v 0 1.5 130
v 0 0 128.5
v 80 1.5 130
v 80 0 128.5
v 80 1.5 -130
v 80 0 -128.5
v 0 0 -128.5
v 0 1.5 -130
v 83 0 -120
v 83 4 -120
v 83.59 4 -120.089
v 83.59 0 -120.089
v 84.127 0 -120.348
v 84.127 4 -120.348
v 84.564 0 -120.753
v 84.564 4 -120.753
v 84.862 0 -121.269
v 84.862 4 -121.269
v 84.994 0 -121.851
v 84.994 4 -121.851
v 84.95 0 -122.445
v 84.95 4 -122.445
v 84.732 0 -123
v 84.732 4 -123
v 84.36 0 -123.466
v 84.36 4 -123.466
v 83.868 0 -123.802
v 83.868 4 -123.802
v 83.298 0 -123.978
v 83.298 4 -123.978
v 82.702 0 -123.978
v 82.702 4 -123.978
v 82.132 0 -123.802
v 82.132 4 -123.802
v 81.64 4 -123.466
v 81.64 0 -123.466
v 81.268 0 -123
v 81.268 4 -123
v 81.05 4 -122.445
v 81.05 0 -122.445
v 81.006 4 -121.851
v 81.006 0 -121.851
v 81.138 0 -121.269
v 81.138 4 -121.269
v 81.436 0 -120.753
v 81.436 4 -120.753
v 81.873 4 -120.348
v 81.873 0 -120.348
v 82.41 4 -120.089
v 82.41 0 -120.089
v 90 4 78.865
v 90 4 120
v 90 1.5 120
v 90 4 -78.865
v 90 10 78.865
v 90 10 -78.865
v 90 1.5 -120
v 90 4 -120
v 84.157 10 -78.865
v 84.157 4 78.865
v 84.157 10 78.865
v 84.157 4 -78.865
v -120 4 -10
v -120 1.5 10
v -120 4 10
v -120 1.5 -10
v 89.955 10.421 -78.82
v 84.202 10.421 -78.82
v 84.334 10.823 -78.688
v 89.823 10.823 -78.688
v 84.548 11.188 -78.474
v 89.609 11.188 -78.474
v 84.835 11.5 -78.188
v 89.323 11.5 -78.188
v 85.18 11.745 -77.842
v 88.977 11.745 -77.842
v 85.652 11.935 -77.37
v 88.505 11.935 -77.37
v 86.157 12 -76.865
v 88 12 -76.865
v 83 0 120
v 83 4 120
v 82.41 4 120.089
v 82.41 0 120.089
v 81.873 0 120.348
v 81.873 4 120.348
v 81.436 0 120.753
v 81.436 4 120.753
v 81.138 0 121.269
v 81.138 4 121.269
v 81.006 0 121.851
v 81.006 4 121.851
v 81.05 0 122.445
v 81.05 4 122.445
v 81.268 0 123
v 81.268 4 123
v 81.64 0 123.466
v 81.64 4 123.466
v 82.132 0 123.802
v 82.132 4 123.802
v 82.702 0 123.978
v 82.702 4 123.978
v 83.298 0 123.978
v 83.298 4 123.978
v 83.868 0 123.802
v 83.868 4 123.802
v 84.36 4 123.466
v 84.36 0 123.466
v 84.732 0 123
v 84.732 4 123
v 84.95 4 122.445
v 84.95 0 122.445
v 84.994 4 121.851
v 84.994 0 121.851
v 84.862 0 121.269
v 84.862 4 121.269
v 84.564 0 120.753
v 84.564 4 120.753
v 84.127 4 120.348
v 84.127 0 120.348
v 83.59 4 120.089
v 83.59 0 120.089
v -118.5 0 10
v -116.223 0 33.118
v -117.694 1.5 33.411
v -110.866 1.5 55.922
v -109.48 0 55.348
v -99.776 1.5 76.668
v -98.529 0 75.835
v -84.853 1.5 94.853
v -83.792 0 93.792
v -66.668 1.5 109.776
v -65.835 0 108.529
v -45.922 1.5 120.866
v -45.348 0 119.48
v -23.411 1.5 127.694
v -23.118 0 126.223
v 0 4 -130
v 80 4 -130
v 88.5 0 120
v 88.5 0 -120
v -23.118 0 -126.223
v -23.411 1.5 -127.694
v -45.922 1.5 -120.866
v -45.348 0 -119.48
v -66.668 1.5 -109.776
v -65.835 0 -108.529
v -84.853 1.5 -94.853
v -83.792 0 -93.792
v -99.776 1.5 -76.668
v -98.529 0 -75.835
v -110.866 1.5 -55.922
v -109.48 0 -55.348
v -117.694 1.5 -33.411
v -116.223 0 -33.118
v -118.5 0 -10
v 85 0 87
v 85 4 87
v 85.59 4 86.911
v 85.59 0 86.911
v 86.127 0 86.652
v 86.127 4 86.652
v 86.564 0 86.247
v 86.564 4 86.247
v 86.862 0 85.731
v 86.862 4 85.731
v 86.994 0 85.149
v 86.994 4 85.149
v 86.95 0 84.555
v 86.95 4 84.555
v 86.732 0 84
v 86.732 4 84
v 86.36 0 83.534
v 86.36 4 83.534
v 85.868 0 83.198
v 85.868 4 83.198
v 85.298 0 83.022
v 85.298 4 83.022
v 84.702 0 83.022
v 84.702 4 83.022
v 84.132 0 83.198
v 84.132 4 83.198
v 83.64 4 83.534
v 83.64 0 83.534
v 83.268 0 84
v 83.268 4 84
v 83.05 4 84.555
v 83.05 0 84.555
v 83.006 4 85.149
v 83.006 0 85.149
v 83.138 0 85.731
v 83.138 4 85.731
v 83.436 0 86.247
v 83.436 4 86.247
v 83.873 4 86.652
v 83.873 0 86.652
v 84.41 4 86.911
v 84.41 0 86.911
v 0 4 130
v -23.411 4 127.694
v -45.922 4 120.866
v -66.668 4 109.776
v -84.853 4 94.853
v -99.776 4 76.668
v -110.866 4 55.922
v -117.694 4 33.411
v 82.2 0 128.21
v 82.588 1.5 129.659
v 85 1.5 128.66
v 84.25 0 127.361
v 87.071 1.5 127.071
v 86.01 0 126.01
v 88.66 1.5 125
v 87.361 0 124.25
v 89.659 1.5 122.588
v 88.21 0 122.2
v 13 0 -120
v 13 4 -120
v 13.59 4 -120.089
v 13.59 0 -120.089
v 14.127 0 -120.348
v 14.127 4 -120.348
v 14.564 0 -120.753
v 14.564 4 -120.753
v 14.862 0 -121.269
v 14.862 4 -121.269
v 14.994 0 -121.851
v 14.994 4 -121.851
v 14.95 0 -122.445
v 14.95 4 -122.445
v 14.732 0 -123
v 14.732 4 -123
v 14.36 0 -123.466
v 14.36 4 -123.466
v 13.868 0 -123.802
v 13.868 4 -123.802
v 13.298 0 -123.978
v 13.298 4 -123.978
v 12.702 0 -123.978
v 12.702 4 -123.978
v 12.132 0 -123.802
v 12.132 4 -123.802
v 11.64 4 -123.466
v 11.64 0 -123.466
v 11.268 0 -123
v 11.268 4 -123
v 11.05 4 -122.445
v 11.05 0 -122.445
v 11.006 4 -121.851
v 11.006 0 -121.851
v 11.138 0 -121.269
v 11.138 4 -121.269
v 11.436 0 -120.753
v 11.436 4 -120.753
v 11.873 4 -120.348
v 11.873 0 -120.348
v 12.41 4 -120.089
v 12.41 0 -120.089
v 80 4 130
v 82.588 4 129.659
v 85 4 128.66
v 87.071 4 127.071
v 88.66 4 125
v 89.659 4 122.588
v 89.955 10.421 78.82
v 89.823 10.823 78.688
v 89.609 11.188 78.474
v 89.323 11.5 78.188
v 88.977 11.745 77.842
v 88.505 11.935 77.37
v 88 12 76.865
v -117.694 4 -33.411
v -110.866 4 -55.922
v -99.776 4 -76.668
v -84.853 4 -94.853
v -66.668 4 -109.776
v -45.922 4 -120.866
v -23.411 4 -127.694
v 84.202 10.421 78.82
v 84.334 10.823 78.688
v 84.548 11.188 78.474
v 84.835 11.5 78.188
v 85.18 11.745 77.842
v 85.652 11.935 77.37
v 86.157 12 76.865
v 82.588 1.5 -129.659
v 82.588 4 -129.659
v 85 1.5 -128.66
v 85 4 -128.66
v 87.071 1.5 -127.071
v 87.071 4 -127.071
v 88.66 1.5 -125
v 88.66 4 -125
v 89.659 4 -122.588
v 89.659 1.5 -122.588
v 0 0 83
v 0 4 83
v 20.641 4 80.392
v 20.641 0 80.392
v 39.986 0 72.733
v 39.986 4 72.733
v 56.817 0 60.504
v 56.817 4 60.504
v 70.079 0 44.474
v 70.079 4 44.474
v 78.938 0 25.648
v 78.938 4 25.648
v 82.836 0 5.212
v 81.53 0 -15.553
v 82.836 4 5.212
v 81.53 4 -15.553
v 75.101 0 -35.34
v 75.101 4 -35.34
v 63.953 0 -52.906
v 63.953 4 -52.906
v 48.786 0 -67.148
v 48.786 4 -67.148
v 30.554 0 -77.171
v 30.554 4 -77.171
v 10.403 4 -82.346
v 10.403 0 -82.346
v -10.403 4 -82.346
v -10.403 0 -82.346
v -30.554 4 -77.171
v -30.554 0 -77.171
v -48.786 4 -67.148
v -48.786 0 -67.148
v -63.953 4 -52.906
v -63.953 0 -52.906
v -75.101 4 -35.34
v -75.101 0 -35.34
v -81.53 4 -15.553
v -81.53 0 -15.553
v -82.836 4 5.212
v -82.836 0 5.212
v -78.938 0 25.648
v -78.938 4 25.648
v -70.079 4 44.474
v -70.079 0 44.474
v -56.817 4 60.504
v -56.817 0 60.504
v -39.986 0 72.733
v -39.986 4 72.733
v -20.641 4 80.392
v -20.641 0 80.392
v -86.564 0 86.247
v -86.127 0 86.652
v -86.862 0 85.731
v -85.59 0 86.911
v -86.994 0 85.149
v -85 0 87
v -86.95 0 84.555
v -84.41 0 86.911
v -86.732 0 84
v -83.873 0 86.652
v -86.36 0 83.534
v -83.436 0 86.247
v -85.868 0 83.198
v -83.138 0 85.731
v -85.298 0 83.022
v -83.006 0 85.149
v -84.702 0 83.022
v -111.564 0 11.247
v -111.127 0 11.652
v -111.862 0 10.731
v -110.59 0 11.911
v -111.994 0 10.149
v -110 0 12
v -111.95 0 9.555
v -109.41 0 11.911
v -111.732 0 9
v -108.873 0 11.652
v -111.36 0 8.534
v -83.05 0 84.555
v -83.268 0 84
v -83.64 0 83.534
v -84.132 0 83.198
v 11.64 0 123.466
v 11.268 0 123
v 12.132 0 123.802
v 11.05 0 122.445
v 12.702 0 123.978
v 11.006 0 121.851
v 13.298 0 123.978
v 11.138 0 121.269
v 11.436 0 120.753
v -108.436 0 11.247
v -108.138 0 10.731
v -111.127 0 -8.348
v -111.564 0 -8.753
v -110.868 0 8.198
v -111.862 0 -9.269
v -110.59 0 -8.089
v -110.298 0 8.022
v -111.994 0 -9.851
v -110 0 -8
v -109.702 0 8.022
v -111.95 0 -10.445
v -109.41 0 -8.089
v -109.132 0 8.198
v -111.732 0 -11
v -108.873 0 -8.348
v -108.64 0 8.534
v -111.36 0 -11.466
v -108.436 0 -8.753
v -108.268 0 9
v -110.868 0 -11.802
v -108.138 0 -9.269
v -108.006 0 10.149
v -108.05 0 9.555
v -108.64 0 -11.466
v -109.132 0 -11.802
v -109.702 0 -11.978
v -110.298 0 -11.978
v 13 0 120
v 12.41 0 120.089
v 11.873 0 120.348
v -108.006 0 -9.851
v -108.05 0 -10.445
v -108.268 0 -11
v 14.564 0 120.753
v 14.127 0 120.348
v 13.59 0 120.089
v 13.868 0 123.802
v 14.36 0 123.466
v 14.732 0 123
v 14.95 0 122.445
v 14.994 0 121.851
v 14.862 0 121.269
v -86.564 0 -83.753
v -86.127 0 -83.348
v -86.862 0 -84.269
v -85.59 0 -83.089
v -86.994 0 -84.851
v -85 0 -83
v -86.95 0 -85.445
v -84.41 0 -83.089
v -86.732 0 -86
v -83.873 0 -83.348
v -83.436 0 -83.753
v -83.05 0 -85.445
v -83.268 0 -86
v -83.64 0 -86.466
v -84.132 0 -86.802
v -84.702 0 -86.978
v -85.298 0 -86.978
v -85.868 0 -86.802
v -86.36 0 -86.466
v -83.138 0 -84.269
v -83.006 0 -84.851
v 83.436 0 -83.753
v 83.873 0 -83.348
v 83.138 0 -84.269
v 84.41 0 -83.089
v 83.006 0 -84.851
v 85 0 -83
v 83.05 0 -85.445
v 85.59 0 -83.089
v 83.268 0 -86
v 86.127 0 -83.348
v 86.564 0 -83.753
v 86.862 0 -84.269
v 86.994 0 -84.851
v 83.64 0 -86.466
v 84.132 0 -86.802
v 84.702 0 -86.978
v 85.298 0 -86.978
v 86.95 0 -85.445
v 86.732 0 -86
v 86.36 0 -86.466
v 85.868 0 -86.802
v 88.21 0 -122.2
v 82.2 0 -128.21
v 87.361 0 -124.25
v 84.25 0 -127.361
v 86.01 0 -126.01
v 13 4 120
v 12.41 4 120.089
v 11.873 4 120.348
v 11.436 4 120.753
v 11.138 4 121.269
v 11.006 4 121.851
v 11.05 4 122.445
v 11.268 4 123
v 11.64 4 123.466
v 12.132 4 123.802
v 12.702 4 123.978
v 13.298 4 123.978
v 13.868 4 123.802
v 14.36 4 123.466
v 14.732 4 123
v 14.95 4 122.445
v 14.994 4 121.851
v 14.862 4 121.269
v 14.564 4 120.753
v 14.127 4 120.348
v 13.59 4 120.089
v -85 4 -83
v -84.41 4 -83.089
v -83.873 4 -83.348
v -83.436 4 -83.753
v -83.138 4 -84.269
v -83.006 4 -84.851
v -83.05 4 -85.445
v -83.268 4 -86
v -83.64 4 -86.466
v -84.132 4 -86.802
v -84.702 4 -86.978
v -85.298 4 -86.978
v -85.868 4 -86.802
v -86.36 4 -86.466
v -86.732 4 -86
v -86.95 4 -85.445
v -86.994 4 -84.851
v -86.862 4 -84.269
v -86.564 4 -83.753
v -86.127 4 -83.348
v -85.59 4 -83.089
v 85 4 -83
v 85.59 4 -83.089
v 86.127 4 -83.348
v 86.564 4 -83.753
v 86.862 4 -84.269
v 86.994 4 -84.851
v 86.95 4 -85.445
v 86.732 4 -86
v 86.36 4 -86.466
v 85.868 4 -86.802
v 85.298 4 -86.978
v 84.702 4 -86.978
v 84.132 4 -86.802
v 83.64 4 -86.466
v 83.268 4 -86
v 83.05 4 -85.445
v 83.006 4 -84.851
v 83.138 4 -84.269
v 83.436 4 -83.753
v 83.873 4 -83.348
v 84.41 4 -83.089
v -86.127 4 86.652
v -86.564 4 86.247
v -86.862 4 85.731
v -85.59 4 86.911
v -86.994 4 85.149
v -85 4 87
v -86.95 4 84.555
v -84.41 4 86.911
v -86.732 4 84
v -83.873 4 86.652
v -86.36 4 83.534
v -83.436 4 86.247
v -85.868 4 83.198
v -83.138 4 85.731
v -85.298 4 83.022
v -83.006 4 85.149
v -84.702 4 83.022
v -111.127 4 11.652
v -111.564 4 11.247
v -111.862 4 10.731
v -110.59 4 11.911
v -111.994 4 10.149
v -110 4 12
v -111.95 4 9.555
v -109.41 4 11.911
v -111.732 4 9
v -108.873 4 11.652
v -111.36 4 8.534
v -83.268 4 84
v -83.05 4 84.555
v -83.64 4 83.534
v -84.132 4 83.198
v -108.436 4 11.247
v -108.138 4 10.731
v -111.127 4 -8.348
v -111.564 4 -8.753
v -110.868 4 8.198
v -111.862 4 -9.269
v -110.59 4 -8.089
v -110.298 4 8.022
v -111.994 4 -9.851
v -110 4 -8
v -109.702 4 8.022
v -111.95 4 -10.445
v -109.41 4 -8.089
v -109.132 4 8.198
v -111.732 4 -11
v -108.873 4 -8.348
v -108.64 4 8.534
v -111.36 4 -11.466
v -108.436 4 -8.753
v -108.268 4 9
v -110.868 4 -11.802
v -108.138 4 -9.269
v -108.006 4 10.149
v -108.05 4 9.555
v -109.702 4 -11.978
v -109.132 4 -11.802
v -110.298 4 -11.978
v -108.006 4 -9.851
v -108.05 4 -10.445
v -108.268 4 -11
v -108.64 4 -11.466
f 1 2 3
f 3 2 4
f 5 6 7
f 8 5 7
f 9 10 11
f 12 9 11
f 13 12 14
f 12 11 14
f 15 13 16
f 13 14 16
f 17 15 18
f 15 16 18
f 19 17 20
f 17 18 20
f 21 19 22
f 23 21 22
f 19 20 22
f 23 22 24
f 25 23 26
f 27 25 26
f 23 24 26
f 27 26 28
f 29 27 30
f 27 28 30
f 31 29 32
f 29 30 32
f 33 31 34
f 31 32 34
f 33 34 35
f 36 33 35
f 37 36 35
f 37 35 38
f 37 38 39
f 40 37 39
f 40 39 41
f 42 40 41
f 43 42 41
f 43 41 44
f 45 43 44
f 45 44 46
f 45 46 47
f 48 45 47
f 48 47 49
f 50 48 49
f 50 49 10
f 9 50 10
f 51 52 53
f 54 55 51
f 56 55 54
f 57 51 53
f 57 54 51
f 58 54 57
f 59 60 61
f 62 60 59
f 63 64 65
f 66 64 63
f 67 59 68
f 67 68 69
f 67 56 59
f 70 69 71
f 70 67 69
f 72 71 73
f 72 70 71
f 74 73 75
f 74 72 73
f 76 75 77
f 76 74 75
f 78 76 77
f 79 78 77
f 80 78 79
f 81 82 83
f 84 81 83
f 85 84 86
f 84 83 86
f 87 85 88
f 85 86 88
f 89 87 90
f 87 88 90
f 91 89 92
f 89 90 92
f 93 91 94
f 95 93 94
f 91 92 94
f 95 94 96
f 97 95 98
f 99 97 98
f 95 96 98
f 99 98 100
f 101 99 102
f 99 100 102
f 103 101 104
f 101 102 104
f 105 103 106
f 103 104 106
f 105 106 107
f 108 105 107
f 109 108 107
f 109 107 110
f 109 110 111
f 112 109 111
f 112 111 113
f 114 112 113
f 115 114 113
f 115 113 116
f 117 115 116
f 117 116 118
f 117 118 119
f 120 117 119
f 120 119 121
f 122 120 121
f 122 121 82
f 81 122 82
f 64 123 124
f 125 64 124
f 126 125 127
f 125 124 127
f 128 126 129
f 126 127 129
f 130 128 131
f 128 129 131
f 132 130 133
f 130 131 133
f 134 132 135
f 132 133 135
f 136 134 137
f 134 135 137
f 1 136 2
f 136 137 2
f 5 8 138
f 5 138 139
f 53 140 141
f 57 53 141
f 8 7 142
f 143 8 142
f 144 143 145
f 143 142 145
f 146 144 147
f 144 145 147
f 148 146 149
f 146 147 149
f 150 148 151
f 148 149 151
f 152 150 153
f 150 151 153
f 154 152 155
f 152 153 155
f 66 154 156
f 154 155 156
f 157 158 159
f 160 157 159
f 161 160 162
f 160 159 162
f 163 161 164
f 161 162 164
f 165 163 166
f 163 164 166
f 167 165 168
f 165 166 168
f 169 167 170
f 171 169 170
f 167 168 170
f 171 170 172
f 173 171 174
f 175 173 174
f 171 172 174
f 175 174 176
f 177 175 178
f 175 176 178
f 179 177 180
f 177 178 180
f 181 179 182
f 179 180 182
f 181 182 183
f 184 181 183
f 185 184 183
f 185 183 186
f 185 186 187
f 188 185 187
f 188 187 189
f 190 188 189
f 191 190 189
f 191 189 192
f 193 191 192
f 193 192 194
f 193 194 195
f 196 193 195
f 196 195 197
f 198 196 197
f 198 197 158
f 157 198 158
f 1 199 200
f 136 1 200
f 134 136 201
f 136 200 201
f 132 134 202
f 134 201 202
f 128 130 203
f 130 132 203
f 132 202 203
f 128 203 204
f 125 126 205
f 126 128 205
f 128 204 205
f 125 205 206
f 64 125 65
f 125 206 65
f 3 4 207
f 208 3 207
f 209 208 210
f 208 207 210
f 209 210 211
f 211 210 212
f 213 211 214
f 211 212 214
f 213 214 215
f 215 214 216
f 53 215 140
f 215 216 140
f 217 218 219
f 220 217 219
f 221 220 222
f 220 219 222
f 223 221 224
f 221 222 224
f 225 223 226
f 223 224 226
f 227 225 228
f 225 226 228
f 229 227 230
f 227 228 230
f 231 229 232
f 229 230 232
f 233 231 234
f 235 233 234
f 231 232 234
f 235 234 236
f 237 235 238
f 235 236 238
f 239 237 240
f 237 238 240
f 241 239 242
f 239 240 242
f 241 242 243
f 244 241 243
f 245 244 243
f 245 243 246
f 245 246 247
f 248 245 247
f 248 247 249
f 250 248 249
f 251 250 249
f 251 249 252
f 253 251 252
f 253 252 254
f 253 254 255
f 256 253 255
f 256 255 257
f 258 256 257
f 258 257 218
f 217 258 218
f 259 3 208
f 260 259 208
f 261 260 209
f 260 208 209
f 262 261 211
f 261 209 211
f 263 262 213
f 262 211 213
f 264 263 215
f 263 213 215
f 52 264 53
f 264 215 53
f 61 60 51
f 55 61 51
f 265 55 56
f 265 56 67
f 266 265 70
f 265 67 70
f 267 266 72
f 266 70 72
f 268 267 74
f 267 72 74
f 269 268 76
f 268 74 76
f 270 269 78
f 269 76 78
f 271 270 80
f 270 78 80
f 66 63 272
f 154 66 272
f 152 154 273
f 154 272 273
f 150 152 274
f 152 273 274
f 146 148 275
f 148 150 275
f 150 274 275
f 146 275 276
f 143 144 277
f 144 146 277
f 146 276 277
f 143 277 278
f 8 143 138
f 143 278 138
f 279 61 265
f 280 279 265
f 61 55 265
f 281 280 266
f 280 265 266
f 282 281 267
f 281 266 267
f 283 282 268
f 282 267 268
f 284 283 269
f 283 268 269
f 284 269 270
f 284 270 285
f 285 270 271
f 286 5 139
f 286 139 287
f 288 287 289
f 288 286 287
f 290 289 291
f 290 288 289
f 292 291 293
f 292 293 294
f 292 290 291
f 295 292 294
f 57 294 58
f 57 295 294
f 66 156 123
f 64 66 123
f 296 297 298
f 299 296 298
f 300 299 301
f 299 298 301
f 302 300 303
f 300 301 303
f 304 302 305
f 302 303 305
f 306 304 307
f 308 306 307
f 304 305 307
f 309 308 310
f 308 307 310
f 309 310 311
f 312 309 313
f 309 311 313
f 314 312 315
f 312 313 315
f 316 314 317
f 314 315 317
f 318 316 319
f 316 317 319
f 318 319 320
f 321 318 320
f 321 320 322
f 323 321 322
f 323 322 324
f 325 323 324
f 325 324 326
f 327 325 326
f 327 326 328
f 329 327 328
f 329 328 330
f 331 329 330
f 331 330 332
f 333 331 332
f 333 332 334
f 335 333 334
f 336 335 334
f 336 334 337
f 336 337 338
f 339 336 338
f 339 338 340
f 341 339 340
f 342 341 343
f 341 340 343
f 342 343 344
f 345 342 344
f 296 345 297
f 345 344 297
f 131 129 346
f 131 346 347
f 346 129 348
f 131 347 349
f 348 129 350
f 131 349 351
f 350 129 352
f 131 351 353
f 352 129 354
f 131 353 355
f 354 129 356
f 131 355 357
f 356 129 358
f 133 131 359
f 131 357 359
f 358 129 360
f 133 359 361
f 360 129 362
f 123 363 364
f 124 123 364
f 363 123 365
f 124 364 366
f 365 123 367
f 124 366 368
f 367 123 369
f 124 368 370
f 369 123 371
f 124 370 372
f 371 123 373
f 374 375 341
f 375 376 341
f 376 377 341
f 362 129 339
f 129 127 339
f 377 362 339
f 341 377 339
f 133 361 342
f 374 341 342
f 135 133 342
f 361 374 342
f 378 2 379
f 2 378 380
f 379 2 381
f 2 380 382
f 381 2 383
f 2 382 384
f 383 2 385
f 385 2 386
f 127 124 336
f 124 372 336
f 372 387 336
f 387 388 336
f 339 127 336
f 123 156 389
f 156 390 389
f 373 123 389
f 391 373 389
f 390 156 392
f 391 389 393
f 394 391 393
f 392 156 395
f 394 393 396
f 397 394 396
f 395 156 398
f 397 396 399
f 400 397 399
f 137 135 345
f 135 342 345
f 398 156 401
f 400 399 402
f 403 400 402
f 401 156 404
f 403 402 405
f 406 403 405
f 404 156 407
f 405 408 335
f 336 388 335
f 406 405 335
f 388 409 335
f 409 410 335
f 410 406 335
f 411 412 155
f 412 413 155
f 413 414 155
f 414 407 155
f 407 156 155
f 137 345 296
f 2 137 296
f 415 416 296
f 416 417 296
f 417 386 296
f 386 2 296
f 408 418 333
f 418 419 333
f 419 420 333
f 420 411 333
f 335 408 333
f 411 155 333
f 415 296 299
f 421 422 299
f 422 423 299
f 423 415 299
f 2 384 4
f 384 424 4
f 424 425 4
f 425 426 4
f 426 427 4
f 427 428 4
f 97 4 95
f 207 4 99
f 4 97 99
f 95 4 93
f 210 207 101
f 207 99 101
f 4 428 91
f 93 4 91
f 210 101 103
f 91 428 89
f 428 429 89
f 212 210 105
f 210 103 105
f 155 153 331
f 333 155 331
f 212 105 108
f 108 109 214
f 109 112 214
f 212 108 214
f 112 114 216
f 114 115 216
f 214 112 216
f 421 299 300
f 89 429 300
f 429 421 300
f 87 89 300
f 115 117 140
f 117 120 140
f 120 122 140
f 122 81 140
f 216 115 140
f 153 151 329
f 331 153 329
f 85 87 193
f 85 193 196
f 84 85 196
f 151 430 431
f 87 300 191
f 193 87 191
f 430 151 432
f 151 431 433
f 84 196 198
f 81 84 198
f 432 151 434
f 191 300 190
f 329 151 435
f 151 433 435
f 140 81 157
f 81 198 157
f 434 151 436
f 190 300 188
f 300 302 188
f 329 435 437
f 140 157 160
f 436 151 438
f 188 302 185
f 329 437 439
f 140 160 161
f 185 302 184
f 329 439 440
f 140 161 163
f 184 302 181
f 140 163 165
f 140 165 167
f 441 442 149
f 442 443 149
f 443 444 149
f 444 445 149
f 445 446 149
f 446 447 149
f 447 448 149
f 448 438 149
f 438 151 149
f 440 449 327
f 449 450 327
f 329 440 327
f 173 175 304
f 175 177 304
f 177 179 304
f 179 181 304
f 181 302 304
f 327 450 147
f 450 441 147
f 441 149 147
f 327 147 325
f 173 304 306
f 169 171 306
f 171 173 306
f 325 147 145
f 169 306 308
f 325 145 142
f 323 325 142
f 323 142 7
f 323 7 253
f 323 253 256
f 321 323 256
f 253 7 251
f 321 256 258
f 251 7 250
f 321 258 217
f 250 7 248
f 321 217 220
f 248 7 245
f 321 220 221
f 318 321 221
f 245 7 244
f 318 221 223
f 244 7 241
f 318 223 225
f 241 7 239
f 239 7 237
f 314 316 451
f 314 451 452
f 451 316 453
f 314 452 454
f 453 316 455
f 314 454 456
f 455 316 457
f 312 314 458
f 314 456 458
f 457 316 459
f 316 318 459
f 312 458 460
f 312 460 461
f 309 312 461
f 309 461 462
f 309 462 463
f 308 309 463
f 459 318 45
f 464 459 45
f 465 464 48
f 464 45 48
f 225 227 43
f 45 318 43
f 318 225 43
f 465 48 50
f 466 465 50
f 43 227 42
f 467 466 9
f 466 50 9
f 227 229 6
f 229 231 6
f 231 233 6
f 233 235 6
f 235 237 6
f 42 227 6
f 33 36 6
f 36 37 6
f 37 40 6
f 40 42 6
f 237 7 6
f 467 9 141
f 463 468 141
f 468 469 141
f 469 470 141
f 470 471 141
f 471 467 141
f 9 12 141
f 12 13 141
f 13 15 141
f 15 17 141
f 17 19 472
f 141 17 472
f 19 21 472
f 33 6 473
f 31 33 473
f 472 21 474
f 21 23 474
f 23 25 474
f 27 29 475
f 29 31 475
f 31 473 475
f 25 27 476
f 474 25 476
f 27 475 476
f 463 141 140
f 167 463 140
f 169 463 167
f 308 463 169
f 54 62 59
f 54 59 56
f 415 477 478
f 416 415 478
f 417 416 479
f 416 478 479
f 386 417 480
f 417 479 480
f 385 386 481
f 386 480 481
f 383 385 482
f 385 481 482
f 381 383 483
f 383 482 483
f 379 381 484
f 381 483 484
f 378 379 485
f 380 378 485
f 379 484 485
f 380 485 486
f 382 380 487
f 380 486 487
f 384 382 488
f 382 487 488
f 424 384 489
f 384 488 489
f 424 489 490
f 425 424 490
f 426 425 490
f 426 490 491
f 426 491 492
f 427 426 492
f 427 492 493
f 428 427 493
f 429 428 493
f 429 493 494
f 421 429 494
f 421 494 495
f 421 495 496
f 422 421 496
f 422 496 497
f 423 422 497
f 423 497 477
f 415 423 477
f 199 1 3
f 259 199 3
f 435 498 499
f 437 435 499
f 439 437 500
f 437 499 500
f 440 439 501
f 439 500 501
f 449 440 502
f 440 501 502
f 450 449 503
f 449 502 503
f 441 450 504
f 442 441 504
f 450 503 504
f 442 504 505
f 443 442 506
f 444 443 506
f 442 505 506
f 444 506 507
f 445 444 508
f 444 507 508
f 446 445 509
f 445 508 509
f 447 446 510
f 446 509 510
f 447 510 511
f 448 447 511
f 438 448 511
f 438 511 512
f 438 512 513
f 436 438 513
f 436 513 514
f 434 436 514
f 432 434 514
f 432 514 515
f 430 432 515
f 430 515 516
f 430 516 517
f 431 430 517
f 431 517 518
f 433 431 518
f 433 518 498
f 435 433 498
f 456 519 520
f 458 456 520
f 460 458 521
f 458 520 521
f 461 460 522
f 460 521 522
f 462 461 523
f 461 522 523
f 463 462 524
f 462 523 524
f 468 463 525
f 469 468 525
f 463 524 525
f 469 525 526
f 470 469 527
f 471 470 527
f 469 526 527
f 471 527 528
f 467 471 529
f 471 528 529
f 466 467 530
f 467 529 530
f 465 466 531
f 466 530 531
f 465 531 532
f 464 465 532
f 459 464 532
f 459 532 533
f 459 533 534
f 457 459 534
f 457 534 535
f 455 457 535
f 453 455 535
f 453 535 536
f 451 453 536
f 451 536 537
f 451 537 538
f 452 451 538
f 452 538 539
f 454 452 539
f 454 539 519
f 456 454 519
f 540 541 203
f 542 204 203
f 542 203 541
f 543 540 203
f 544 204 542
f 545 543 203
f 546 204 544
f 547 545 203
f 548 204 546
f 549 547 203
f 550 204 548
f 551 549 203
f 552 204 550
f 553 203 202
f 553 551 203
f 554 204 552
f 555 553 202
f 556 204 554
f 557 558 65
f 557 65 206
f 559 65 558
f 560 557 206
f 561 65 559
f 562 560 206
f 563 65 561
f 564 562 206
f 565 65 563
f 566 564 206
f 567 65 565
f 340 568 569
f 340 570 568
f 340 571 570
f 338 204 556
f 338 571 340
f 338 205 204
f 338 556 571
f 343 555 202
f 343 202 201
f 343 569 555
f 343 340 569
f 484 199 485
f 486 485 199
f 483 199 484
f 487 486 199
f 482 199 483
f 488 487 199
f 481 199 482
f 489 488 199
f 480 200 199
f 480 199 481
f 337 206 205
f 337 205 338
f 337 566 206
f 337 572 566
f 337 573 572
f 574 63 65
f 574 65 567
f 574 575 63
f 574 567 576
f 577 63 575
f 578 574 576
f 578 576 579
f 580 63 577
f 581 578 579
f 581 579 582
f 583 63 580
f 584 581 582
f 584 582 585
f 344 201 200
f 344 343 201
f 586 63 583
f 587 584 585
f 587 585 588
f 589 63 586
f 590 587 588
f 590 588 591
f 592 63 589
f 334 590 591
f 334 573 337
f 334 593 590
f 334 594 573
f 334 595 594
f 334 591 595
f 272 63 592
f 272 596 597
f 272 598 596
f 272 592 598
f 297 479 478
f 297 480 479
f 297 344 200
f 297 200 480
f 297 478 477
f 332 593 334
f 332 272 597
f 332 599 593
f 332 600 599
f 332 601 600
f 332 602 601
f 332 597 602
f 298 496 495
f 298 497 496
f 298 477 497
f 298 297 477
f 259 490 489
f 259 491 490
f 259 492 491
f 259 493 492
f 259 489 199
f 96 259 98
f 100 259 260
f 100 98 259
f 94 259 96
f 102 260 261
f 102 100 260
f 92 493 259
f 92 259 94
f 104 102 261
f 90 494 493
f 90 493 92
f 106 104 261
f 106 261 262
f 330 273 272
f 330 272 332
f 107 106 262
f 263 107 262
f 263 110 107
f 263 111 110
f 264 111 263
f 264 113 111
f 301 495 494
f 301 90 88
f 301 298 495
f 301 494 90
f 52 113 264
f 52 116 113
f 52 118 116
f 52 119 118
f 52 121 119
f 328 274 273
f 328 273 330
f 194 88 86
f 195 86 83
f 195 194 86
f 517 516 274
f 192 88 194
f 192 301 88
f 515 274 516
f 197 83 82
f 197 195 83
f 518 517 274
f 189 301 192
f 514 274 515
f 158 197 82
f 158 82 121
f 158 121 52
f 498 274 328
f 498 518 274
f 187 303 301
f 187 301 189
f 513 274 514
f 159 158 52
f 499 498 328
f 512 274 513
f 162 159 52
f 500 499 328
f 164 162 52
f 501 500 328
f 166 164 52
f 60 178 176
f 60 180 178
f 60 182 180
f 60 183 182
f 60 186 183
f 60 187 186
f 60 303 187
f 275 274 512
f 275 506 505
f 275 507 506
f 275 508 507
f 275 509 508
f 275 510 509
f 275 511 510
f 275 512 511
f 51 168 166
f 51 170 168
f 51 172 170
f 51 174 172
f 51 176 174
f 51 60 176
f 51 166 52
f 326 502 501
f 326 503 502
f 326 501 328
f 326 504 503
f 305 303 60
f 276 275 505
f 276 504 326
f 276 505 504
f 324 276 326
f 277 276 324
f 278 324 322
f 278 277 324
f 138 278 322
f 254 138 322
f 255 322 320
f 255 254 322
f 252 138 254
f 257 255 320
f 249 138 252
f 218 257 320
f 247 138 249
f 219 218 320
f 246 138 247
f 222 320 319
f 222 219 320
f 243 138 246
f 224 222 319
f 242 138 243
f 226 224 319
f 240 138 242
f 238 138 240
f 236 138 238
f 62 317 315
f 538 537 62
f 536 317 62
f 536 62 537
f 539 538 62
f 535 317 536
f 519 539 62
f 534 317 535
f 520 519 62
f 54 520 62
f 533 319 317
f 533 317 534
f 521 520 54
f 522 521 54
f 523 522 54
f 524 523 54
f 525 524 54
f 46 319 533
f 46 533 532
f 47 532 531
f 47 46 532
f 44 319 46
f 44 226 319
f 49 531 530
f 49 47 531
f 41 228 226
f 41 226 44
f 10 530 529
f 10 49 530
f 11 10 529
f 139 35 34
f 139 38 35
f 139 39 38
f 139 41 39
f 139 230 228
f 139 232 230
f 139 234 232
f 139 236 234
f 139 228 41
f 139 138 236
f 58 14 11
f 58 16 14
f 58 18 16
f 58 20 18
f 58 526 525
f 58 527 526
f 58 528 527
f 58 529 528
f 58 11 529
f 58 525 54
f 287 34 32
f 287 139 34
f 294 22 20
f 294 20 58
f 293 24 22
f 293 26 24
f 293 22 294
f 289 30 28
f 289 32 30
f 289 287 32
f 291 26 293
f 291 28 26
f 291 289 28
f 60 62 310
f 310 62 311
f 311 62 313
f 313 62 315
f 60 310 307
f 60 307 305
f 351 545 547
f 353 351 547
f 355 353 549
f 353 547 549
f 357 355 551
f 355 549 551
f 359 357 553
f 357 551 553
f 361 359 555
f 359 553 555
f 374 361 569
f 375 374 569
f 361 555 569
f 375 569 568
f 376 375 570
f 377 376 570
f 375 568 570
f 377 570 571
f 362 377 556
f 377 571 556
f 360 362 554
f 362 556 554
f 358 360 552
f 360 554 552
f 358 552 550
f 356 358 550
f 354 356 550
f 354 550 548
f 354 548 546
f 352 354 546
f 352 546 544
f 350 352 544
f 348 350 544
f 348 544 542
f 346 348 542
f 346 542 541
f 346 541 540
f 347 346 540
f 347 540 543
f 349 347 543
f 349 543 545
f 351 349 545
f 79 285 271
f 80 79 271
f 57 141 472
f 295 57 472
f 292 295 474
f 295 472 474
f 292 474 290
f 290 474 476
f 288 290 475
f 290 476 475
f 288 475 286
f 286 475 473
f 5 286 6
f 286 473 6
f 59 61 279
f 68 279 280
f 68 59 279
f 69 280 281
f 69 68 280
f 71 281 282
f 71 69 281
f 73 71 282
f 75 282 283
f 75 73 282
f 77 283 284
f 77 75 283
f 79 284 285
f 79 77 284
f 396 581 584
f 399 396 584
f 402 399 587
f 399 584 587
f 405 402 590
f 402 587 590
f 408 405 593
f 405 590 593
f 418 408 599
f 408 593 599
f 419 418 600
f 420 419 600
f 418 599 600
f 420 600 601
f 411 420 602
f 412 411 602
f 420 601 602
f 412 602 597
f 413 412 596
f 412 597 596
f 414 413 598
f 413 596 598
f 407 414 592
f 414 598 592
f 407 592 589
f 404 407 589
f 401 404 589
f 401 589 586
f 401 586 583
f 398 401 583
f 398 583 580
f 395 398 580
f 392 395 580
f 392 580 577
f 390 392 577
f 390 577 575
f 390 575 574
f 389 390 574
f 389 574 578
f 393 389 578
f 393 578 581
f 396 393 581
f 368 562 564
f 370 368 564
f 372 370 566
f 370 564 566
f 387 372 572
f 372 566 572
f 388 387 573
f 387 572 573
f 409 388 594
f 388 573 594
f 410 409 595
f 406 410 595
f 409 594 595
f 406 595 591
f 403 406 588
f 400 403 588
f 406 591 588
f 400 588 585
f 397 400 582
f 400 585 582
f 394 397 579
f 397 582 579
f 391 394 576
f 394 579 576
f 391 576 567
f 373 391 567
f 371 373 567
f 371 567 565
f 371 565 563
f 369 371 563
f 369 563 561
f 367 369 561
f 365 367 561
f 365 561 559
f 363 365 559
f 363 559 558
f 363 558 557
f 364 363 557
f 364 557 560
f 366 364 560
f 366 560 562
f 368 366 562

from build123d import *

# Parameters (mm, degrees)
SKETCH_1_W          = 240
SKETCH_1_H          = 260
EXTRUDE_1_DEPTH     = 4
SKETCH_2_R          = 2
CUT_EXTRUDE_1_DEPTH = 177.963273026
SKETCH_3_W          = 30
SKETCH_3_H          = 260
CUT_EXTRUDE_2_DEPTH = 6
FILLET_2_R          = 10
FILLET_3_R          = 120
SKETCH_4_R          = 83
CUT_EXTRUDE_3_DEPTH = 6
SKETCH_5_W          = 5.842752146
SKETCH_5_H          = 157.729812976
EXTRUDE_2_DEPTH     = 8
FILLET_4_R          = 2
CHAMFER_1_SIZE      = 1.5


with BuildPart() as part:
    # Эскиз1 → Бобышка-Вытянуть1 (new body)
    with BuildSketch(Plane(origin=(0, 0, 0), x_dir=(1, 0, 0), z_dir=(0, 1, 0))):
        Rectangle(SKETCH_1_W, SKETCH_1_H)
    extrude(amount=EXTRUDE_1_DEPTH)

    # Эскиз2 → Вырез-Вытянуть1 (cut, through all)
    with BuildSketch(Plane(origin=(0, 4, 0), x_dir=(1, 0, 0), z_dir=(0, 1, 0))):
        with Locations(Location((83, 122, 0), (0, 0, 270))):
            Circle(SKETCH_2_R)
        with Locations(Location((13, 122, 0), (0, 0, 270))):
            Circle(SKETCH_2_R)
        with Locations(Location((83, -122, 0), (0, 0, 90))):
            Circle(SKETCH_2_R)
        with Locations(Location((13, -122, 0), (0, 0, 90))):
            Circle(SKETCH_2_R)
        with Locations(Location((-110, 10, 0), (0, 0, 270))):
            Circle(SKETCH_2_R)
        with Locations(Location((-110, -10, 0), (0, 0, 270))):
            Circle(SKETCH_2_R)
        with Locations(Location((-85, 85, 0), (0, 0, 270))):
            Circle(SKETCH_2_R)
        with Locations(Location((85, 85, 0), (0, 0, 270))):
            Circle(SKETCH_2_R)
        with Locations(Location((-85, -85, 0), (0, 0, 270))):
            Circle(SKETCH_2_R)
        with Locations(Location((85, -85, 0), (0, 0, 270))):
            Circle(SKETCH_2_R)
    extrude(amount=-CUT_EXTRUDE_1_DEPTH, mode=Mode.SUBTRACT)

    # Эскиз3 → Вырез-Вытянуть2 (cut)
    with BuildSketch(Plane(origin=(0, 4, 0), x_dir=(1, 0, 0), z_dir=(0, 1, 0))):
        with Locations((105, 0)):
            Rectangle(SKETCH_3_W, SKETCH_3_H)
    extrude(amount=-CUT_EXTRUDE_2_DEPTH, mode=Mode.SUBTRACT)

    # Скругление2
    fillet_2_edges = [part.edges().sort_by_distance(p)[0] for p in [
        (90, 2, 130),
        (90, 2, -130),
    ]]
    fillet(fillet_2_edges, radius=FILLET_2_R)

    # Скругление3
    fillet_3_edges = [part.edges().sort_by_distance(p)[0] for p in [
        (-120, 2, 130),
        (-120, 2, -130),
    ]]
    fillet(fillet_3_edges, radius=FILLET_3_R)

    # Эскиз4 → Вырез-Вытянуть3 (cut)
    with BuildSketch(Plane(origin=(0, 4, 0), x_dir=(1, 0, 0), z_dir=(0, 1, 0))):
        with Locations(Location((0, 0, 0), (0, 0, 270))):
            Circle(SKETCH_4_R)
    extrude(amount=-CUT_EXTRUDE_3_DEPTH, mode=Mode.SUBTRACT)

    # Эскиз5 → Бобышка-Вытянуть2 (add)
    with BuildSketch(Plane(origin=(0, 4, 0), x_dir=(1, 0, 0), z_dir=(0, 1, 0))):
        with Locations((87.078623927, 0)):
            Rectangle(SKETCH_5_W, SKETCH_5_H)
    extrude(amount=EXTRUDE_2_DEPTH)

    # Скругление4
    fillet_4_edges = [part.edges().sort_by_distance(p)[0] for p in [
        (90, 12, 0),
        (87.078623927, 12, -78.864906488),
        (84.157247854, 12, 0),
        (87.078623927, 12, 78.864906488),
    ]]
    fillet(fillet_4_edges, radius=FILLET_4_R)

    # Фаска1
    chamfer_1_edges = [part.edges().sort_by_distance(p)[0] for p in [
        (90, 0, 0),
        (40, 0, -130),
        (87.071067812, 0, 127.071067812),
        (87.071067812, 0, -127.071067812),
        (-120, 0, 0),
        (40, 0, 130),
        (-84.852813742, 0, 94.852813742),
        (-84.852813742, 0, -94.852813742),
    ]]
    chamfer(chamfer_1_edges, length=CHAMFER_1_SIZE)


solid = part.part
